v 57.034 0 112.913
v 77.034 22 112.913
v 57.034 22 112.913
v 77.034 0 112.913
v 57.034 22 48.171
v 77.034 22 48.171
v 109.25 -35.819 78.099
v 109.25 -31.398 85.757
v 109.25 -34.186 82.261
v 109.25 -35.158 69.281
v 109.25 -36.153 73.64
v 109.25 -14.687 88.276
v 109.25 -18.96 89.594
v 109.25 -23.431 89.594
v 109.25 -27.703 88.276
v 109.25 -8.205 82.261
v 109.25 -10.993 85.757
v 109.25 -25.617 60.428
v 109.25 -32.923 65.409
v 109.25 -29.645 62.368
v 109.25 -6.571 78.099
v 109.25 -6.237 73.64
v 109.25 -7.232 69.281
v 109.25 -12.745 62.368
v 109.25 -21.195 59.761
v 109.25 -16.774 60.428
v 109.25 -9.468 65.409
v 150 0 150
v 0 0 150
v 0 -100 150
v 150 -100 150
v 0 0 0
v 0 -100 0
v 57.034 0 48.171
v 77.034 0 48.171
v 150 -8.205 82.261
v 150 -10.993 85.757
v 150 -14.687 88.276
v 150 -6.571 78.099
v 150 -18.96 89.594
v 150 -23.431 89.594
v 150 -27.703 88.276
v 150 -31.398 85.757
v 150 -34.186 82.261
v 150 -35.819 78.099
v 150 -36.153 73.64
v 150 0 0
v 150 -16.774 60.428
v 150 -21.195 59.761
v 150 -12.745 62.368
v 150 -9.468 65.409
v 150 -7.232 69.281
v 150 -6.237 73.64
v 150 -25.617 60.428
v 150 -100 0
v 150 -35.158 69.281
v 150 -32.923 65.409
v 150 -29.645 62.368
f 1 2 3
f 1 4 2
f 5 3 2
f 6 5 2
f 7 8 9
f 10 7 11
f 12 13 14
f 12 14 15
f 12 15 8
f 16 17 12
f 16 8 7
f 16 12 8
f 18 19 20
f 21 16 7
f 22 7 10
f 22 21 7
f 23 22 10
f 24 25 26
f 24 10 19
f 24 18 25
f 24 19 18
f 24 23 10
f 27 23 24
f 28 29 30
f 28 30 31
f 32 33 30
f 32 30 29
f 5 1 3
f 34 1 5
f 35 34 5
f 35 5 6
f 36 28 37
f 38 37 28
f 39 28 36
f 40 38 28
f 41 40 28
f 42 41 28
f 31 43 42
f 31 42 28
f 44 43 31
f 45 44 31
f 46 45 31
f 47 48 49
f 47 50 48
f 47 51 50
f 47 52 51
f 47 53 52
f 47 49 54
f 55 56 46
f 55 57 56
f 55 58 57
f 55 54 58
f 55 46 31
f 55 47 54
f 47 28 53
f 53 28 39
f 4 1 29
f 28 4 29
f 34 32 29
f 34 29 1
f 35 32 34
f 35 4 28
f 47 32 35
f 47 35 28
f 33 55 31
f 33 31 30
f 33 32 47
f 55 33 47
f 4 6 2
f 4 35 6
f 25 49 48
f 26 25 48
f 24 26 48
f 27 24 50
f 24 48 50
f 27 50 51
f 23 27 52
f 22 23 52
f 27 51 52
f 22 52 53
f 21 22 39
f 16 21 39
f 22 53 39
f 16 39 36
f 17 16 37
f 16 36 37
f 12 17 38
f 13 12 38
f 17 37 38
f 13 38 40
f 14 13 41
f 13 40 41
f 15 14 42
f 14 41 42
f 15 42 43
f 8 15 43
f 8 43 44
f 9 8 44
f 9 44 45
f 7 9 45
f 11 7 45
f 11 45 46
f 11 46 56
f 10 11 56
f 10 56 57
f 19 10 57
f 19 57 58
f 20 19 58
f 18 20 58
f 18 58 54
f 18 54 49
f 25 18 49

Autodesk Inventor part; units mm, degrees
ref_plane "YZ Plane" through (0, 0, 0) normal (1, 0, 0) x (0, 1, 0)
ref_plane "XZ Plane" through (0, 0, 0) normal (0, 1, 0) x (-1, 0, 0)
ref_plane "XY Plane" through (0, 0, 0) normal (0, 0, 1) x (1, 0, 0)
sketch "Sketch1" plane through (0, 0, 0) normal (0, 1, 0) x (-1, 0, 0)
  point P0 (0, 0)
sketch "Sketch2" plane through (0, 0, 0) normal (0, 0, 1) x (1, 0, 0)
  line L0 (0, 0) -> (150, 0)
  line L1 (150, 0) -> (150, -100)
  line L2 (150, -100) -> (0, -100)
  line L3 (0, -100) -> (0, 0)
extrude "Extrusion1" add sketch "Sketch2" along normal blind 150
sketch "Sketch3" plane through (150, -100, 0) normal (1, 0, 0) x (0, 0, -1)
  circle A0 centre (-74.7614, 78.8048) radius 15
  point P0 (0, 100)
  dimension "d4" = 30
extrude "Extrusion2" cut sketch "Sketch3" against normal blind 40.75
sketch "Sketch4" plane through (0, 0, 0) normal (0, 1, 0) x (1, 0, 0)
  line L0 (57.0345, -48.171) -> (77.0345, -48.171)
  line L1 (77.0345, -48.171) -> (77.0345, -112.9129)
  line L2 (77.0345, -112.9129) -> (57.0345, -112.9129)
  line L3 (57.0345, -112.9129) -> (57.0345, -48.171)
  point P0 (0, 0)
extrude "Extrusion3" add sketch "Sketch4" along normal blind 22
properties part number "water tank 1" material "PVC, Unplasticized"
